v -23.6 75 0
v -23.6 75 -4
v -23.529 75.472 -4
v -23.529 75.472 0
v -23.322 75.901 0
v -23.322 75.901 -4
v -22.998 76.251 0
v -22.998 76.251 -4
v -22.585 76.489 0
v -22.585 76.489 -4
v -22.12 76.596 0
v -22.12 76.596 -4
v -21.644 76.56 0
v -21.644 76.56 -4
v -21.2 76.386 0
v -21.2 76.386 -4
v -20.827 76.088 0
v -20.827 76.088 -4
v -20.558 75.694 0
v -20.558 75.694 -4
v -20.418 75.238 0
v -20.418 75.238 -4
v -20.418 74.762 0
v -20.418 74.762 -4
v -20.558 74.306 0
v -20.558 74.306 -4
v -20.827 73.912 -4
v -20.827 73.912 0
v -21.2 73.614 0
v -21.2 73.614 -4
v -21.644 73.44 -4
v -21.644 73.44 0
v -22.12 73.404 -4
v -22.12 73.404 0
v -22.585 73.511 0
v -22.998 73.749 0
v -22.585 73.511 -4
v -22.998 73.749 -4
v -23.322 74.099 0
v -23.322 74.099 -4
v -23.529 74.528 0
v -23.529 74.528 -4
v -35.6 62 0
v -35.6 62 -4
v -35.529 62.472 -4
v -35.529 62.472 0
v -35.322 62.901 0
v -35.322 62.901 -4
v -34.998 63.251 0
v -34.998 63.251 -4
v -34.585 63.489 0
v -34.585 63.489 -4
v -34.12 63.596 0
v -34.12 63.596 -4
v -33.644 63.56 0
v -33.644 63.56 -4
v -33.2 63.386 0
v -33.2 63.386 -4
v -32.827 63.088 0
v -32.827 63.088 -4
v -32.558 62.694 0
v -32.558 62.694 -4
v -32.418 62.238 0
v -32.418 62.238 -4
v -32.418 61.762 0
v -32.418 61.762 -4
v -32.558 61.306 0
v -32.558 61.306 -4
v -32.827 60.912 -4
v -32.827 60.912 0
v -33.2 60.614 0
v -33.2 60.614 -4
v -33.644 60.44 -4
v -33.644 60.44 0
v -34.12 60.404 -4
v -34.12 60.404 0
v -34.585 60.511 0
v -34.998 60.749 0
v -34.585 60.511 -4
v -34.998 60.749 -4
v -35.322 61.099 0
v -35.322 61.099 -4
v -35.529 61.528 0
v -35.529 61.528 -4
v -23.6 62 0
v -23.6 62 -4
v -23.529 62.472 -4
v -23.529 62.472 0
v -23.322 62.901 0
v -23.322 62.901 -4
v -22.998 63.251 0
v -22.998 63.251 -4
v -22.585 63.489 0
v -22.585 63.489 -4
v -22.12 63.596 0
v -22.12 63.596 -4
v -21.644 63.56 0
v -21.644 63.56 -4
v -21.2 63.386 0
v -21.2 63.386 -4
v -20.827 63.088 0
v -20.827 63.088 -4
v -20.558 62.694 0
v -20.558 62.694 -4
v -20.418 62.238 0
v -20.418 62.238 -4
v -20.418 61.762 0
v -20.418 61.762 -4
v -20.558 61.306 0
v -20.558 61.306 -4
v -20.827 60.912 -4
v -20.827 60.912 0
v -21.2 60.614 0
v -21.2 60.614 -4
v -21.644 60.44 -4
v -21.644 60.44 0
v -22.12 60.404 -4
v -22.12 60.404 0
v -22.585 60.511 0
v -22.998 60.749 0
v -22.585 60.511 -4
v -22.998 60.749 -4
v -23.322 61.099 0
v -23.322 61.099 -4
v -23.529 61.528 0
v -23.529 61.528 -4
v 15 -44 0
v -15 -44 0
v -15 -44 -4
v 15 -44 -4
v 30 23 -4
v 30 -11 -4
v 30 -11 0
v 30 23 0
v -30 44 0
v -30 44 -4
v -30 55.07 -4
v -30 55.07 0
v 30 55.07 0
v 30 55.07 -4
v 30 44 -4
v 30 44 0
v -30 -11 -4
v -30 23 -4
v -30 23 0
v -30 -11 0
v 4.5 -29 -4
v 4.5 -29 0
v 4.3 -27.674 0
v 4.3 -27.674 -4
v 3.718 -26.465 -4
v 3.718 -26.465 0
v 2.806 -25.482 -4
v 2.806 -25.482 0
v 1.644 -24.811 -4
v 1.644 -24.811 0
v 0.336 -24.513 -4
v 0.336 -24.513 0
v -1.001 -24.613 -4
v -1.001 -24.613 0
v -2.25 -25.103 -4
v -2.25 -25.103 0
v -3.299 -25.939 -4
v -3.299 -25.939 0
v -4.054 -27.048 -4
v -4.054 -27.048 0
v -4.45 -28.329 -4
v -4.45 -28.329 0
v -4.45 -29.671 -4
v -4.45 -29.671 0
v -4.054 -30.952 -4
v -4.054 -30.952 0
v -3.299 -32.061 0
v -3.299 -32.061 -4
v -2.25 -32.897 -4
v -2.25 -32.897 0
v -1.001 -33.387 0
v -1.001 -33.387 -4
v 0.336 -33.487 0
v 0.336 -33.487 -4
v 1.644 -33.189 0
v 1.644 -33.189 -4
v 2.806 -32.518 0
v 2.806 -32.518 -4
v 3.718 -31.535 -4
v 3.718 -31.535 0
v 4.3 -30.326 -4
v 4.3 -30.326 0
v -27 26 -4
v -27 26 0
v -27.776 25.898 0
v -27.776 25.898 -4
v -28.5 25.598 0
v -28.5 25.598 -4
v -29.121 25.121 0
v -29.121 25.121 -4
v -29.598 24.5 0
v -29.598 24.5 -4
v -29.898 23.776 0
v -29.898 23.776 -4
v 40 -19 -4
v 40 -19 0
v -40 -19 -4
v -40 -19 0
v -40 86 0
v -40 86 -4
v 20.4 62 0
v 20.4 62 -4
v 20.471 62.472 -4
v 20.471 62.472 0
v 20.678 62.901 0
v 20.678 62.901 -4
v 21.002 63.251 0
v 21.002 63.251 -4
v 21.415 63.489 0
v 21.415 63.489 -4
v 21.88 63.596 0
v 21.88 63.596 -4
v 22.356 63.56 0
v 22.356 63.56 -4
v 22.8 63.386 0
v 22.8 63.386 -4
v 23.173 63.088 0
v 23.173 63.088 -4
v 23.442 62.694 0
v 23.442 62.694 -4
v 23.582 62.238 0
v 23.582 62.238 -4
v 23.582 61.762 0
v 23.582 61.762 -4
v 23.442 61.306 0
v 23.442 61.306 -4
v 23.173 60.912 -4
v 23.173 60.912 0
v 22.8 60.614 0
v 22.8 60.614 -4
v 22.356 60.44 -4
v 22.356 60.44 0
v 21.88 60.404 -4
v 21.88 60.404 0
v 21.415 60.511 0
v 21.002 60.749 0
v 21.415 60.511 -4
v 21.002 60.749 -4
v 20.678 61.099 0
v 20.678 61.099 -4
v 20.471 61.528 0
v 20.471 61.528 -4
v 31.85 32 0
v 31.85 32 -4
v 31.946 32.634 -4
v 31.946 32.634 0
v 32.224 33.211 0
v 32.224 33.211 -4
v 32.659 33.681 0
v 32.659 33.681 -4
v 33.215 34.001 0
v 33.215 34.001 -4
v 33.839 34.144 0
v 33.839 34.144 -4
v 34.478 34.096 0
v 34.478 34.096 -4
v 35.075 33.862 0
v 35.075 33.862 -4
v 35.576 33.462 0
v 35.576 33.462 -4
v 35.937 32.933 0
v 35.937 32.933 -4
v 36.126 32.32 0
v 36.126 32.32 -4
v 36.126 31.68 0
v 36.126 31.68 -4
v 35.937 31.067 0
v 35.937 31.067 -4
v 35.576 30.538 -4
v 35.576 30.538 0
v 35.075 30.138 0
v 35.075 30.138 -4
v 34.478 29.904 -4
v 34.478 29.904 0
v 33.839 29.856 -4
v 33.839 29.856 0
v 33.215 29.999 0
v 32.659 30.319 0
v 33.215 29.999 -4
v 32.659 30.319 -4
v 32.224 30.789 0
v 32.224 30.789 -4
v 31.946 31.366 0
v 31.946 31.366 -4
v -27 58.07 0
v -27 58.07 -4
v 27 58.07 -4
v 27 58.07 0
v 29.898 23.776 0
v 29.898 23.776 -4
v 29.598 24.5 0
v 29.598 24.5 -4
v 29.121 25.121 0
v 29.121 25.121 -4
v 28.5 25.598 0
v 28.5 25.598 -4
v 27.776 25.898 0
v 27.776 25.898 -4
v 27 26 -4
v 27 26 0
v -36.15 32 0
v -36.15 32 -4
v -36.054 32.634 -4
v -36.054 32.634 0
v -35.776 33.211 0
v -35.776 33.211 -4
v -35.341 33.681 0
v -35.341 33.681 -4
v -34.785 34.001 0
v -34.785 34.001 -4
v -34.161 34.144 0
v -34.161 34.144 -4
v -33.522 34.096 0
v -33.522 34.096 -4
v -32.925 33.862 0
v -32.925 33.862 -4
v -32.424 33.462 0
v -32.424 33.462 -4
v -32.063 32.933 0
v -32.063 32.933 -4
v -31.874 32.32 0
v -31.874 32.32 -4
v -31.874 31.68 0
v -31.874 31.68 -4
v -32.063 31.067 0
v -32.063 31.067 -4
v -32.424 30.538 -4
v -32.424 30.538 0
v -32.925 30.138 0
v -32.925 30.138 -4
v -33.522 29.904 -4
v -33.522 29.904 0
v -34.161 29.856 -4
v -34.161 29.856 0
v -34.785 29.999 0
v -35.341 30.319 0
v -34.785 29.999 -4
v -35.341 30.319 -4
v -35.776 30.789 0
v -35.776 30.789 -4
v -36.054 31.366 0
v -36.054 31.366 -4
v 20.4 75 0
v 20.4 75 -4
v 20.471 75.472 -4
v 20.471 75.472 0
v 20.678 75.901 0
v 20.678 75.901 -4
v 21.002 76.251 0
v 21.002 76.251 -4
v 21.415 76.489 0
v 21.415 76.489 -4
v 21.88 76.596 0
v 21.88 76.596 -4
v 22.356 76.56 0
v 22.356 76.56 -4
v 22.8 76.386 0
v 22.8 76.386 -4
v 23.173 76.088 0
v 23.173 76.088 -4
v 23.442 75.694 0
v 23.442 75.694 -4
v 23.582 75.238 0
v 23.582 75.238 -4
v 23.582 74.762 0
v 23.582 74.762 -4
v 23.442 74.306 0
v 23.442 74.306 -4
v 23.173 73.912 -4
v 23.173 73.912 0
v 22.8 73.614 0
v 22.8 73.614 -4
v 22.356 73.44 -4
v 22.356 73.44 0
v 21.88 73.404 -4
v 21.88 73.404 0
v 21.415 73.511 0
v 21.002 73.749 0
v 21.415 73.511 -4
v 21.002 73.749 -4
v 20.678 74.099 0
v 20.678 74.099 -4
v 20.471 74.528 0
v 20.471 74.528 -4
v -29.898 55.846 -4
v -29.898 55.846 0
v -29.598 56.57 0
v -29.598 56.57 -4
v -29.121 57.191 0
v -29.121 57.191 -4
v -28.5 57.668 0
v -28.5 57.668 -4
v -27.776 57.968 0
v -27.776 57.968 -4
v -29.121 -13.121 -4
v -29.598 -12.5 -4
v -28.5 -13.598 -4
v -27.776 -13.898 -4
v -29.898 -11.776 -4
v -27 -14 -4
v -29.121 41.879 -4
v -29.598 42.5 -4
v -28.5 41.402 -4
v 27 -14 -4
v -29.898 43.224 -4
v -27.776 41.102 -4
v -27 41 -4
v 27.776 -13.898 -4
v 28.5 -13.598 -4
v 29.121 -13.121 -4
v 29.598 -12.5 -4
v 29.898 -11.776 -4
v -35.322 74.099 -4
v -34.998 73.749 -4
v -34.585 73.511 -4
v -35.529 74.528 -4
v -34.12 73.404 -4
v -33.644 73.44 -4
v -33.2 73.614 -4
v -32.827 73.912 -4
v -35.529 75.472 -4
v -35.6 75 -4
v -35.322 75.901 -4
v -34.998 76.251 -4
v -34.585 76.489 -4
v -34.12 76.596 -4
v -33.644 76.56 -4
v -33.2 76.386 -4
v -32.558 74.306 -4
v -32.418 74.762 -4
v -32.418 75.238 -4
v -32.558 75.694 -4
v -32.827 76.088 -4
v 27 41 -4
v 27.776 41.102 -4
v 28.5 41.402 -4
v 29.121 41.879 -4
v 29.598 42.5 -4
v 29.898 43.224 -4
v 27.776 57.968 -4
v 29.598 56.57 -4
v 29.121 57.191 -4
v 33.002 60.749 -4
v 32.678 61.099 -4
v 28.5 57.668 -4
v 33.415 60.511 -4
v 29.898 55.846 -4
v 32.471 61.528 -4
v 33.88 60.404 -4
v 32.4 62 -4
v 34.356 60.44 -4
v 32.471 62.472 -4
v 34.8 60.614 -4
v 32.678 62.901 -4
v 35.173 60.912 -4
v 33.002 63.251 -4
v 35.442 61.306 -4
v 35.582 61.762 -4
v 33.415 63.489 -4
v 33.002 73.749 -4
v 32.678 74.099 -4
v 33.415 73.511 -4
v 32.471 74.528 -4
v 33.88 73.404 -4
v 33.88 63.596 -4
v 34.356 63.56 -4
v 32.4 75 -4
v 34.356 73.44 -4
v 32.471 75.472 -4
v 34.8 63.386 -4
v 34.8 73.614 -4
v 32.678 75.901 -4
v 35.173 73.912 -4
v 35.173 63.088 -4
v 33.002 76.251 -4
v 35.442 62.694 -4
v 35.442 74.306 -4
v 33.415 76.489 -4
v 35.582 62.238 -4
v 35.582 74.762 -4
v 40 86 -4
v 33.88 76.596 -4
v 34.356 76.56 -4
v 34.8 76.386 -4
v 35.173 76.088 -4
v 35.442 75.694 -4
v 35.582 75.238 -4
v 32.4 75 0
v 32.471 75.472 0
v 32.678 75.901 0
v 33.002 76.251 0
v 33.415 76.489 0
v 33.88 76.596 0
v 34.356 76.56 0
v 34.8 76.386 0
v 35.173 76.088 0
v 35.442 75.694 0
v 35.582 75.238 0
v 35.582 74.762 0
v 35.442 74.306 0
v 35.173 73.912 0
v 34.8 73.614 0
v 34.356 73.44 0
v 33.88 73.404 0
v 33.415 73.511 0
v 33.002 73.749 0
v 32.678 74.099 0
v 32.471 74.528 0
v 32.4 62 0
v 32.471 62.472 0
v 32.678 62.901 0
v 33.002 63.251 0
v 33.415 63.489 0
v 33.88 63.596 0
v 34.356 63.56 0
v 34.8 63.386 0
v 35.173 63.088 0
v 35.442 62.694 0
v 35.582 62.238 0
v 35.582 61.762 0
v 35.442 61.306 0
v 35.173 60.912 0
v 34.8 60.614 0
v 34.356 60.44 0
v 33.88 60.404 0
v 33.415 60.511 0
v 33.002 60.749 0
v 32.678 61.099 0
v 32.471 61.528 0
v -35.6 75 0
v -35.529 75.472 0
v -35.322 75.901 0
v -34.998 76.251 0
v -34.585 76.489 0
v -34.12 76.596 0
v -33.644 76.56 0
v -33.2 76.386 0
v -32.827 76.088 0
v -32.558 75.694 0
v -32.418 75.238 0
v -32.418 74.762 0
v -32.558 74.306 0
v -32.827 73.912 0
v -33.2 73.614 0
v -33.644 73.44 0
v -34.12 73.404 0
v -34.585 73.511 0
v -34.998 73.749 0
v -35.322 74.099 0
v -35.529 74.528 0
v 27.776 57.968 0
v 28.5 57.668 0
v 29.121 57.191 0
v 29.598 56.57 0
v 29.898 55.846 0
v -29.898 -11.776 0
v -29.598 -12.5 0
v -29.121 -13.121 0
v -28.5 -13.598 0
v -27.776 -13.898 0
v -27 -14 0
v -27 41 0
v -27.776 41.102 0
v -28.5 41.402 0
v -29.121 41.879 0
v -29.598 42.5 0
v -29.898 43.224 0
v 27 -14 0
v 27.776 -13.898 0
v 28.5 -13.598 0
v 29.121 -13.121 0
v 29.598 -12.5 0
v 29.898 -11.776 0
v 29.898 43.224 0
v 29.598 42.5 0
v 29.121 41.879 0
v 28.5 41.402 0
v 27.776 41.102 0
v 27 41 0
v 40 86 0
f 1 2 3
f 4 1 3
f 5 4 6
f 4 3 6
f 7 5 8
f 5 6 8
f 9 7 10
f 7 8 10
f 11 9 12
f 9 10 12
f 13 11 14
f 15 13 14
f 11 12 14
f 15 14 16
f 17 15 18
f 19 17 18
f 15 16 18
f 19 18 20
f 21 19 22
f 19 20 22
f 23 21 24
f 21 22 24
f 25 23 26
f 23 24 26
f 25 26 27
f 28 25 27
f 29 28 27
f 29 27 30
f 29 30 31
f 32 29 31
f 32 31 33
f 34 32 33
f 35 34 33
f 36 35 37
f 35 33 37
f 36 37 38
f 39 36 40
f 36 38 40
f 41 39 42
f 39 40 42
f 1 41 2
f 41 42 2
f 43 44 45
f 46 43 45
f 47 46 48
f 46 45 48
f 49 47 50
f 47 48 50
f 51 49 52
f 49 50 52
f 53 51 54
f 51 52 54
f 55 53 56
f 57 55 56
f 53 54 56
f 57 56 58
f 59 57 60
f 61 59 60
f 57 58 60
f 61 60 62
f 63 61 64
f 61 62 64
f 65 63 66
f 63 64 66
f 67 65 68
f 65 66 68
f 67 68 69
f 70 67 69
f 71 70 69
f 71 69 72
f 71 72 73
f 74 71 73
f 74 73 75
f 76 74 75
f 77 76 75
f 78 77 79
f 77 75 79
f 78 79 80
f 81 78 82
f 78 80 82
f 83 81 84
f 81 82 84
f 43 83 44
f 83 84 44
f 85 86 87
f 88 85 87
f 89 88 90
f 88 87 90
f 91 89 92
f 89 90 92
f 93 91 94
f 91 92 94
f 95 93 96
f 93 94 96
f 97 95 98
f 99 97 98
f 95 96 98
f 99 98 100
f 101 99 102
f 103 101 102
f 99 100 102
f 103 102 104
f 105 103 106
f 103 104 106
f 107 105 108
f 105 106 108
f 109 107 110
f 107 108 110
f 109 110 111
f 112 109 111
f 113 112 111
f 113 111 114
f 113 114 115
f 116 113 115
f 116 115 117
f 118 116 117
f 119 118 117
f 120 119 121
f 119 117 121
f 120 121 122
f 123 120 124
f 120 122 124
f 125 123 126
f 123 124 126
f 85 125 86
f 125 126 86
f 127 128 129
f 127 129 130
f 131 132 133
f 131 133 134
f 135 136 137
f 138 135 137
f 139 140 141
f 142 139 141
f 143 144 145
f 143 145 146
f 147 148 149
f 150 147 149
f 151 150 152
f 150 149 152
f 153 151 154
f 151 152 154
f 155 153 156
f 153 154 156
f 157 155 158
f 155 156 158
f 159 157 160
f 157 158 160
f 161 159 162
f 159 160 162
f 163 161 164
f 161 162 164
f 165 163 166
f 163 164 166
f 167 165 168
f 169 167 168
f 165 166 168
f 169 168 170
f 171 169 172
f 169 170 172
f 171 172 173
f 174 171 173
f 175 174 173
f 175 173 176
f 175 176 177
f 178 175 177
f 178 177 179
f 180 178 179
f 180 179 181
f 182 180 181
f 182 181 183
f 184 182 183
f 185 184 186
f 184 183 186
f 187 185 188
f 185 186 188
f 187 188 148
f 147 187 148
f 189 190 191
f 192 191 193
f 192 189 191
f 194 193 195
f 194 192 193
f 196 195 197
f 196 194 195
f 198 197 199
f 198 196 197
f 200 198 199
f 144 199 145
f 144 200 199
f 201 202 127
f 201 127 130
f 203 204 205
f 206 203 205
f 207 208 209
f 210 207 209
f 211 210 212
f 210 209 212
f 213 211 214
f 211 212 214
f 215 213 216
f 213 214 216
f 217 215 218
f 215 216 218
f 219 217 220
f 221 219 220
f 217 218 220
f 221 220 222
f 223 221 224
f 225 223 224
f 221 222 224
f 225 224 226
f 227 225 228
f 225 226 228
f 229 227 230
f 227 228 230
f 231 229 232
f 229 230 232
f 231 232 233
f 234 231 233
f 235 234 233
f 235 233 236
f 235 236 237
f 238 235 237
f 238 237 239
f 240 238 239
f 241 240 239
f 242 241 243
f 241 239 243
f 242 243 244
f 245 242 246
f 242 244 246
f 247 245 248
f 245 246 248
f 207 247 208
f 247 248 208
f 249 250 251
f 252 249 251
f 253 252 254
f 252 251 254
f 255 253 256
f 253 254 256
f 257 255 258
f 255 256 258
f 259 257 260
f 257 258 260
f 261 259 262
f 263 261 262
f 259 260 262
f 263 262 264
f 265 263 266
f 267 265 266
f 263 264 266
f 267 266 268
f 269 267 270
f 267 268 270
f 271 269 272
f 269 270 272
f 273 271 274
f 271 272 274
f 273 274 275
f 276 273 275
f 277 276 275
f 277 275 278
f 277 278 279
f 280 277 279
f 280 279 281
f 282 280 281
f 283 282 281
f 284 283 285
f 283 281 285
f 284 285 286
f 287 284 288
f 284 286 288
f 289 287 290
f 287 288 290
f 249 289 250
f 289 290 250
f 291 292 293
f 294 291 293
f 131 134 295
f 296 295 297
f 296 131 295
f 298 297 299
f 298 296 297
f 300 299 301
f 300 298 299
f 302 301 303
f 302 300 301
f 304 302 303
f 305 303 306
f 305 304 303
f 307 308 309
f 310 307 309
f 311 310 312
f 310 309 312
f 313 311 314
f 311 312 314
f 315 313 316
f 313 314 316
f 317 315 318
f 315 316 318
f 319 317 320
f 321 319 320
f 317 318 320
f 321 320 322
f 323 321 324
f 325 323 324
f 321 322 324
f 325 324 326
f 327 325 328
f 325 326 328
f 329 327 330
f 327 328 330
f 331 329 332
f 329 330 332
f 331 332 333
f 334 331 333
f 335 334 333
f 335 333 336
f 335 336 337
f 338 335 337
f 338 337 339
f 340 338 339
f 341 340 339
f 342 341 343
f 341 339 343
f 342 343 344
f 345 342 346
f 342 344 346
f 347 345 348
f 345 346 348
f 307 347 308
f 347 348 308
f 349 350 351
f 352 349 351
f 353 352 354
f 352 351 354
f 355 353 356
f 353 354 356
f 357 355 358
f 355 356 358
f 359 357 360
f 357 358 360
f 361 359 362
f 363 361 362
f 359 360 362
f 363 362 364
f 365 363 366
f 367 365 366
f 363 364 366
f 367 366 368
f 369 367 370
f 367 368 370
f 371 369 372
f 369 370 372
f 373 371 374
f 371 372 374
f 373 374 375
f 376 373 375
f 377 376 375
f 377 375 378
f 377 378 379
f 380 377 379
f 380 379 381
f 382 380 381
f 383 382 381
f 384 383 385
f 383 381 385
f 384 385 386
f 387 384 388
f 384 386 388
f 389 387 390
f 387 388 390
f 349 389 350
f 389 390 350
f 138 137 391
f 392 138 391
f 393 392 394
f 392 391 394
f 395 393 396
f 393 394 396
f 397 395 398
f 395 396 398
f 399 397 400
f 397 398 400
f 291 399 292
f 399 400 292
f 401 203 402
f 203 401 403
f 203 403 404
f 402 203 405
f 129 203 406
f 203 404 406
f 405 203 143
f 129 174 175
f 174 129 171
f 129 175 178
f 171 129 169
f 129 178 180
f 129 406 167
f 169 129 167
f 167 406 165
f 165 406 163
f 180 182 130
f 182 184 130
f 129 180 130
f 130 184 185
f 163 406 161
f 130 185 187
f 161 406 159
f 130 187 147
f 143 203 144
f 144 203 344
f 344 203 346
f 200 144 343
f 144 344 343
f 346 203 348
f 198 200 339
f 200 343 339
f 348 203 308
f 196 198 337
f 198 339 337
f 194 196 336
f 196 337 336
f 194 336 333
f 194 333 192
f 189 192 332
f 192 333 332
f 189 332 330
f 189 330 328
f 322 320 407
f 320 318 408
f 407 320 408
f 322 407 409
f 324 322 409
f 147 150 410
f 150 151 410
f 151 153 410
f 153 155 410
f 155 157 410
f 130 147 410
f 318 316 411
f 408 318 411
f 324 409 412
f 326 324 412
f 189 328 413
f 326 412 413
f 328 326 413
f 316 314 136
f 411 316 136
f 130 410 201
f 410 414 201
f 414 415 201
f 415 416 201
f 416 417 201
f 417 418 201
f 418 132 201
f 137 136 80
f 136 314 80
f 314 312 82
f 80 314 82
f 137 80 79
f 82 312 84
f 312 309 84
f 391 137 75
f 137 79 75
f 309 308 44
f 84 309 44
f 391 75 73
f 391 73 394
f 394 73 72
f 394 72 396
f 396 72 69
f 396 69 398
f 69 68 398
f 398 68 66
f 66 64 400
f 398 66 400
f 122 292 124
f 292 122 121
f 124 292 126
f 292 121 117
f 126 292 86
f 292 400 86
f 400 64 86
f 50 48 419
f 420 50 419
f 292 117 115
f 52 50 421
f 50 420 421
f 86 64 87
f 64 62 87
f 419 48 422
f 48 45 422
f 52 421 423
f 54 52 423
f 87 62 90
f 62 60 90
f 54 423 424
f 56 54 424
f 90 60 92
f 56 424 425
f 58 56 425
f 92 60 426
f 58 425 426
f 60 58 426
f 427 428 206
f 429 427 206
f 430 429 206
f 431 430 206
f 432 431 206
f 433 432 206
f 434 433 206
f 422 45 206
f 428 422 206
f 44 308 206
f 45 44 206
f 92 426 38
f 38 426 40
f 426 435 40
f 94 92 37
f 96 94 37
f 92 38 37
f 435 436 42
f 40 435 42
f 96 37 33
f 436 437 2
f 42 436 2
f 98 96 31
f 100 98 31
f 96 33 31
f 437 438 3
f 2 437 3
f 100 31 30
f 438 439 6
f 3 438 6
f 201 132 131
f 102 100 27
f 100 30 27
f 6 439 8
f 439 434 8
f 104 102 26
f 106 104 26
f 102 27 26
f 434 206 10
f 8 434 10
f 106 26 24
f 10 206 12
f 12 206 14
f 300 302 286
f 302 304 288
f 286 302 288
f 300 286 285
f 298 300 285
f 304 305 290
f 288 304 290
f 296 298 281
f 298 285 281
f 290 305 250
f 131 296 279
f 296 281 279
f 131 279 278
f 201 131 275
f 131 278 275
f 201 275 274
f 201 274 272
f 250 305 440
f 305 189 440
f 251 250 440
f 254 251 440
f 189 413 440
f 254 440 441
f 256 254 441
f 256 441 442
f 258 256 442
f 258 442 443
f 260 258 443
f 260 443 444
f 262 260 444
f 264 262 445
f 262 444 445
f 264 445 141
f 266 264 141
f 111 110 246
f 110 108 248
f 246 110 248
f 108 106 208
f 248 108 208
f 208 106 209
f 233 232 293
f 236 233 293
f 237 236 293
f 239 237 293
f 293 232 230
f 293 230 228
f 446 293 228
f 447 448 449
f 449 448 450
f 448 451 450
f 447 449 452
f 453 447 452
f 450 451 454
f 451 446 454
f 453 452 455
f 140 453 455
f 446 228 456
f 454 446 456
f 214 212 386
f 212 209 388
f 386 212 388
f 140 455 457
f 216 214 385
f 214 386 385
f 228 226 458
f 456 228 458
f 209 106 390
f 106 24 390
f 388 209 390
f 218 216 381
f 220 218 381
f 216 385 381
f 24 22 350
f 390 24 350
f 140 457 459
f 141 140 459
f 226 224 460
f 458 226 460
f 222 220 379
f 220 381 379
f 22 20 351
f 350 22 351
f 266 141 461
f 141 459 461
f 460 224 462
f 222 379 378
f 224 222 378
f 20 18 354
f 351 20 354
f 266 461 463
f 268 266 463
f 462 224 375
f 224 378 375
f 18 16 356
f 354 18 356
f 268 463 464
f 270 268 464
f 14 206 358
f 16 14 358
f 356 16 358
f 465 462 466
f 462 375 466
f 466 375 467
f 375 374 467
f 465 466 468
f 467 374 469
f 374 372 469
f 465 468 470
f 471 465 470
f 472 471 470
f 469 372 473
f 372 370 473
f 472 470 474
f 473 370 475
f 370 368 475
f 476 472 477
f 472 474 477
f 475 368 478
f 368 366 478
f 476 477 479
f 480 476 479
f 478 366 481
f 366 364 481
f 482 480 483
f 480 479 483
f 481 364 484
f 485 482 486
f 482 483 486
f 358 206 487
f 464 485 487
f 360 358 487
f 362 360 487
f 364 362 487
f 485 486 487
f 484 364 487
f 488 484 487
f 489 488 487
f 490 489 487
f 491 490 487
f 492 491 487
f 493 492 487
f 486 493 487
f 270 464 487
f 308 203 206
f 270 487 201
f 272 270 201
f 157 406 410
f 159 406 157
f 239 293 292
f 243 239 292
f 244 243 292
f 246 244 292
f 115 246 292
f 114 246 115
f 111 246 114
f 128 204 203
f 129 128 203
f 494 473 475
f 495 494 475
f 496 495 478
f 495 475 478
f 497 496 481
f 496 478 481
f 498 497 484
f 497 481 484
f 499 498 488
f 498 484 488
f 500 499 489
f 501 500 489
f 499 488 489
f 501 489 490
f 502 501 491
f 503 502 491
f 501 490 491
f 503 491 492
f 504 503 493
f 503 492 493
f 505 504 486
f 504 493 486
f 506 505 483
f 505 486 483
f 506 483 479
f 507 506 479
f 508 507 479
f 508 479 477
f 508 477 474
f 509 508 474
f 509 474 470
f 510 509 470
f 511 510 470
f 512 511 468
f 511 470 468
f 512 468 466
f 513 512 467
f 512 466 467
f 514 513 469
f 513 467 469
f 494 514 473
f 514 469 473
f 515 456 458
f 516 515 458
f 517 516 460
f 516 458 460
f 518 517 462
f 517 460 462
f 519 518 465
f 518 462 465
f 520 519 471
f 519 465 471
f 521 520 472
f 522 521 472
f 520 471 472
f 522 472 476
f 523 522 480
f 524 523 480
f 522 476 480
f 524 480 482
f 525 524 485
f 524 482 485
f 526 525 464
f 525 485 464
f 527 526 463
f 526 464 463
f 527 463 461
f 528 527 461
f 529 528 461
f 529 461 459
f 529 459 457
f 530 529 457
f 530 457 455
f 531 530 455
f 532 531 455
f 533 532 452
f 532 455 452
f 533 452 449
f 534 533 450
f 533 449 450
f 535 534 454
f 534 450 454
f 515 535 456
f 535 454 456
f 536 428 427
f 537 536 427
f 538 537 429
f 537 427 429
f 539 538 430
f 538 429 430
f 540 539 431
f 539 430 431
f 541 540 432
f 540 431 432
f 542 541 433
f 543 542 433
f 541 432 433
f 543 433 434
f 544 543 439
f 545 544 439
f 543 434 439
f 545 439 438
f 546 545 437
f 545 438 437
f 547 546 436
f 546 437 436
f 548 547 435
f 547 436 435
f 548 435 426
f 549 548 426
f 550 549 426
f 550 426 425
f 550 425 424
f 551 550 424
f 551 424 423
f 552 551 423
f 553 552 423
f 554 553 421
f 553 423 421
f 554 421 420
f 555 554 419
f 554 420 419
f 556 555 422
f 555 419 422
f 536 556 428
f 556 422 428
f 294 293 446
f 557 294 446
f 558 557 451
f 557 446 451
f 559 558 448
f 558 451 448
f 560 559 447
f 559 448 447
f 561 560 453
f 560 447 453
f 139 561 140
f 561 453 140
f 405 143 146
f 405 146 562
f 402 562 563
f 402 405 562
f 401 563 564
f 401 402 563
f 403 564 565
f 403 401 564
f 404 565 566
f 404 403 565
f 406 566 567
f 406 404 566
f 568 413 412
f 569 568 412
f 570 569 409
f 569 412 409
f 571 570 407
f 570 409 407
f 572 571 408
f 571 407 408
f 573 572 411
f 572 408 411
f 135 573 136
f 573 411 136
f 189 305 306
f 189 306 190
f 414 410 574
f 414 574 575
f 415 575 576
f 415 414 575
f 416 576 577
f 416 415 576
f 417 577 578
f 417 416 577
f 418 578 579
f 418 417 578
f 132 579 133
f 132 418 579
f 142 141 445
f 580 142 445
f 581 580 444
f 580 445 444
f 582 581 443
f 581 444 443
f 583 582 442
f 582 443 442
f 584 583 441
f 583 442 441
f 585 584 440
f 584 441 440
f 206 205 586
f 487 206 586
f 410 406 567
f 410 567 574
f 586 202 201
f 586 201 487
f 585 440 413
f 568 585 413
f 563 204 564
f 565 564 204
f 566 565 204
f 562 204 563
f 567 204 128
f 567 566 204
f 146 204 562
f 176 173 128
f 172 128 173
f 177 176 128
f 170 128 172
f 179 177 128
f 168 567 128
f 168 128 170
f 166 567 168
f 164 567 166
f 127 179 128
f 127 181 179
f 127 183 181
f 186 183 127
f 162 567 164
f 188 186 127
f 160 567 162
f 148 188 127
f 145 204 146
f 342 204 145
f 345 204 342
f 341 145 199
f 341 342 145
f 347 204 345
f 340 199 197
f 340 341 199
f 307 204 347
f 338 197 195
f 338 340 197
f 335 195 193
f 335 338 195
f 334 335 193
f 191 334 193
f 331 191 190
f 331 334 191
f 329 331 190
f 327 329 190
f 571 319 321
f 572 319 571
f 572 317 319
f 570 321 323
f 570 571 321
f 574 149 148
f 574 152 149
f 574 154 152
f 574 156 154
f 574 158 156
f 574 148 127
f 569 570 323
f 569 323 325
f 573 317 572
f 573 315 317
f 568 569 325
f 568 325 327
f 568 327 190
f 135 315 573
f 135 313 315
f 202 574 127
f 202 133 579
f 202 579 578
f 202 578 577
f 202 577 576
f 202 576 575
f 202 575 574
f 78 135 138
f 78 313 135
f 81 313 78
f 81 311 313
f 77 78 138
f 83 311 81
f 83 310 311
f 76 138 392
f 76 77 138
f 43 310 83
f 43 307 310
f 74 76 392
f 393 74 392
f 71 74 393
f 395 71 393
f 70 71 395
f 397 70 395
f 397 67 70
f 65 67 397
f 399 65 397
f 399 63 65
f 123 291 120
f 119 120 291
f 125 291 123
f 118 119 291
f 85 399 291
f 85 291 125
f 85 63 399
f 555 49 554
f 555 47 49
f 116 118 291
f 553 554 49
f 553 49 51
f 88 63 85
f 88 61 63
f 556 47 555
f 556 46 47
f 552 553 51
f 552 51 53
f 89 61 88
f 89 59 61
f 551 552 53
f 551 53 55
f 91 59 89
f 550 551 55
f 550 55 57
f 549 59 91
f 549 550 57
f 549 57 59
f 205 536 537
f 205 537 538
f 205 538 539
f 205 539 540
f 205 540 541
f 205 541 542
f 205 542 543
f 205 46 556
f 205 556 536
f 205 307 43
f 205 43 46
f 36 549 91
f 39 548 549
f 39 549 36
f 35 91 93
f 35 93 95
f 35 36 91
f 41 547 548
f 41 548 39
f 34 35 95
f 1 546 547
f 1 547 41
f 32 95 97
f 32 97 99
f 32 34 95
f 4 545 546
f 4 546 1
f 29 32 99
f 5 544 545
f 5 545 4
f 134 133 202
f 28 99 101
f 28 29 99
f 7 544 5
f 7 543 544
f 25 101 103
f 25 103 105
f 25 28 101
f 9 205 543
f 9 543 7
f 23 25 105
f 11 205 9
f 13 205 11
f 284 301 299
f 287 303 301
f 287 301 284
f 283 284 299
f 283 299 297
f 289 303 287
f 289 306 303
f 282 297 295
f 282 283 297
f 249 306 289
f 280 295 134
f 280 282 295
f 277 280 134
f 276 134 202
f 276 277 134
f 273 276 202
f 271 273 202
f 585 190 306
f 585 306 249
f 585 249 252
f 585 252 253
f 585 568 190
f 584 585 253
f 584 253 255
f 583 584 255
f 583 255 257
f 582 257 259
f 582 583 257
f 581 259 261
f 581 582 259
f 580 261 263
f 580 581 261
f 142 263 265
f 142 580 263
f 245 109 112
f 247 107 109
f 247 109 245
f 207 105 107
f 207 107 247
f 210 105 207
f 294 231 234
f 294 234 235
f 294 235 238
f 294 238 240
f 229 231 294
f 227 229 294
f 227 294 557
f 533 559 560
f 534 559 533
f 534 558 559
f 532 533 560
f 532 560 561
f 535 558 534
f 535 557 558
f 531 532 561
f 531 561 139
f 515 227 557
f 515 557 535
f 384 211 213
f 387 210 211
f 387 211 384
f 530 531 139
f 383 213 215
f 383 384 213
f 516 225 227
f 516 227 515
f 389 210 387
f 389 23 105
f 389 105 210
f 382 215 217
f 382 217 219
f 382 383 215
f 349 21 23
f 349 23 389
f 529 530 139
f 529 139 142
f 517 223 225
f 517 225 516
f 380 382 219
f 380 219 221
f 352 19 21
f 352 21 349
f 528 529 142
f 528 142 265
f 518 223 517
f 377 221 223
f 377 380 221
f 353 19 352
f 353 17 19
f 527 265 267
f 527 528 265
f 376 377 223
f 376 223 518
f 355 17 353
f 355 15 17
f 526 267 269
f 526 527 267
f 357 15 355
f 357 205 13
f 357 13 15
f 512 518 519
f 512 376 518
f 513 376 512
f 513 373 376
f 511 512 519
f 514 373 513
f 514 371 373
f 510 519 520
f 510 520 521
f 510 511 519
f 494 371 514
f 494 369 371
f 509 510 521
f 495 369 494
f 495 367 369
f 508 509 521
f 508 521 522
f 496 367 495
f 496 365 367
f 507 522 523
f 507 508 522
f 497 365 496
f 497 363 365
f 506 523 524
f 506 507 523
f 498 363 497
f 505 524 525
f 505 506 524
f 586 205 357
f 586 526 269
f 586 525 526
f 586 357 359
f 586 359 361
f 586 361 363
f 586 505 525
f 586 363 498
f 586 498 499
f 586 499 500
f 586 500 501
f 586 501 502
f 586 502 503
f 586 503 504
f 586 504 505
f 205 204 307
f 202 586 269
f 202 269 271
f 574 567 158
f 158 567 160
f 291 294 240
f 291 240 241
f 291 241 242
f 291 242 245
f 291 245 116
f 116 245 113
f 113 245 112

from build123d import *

# Parameters (mm, degrees)
SKETCH_1_W          = 80
SKETCH_1_H          = 130
SKETCH_1_R          = 4.5
EXTRUDE_1_DEPTH     = 4
CHAMFER_1_SIZE      = 25
CUT_EXTRUDE_1_DEPTH = 5
SKETCH_4_R          = 2.15
CUT_EXTRUDE_2_DEPTH = 4
SKETCH_5_R          = 1.6
CUT_EXTRUDE_3_DEPTH = 4


with BuildPart() as part:
    # 草图1 → 凸台-拉伸1 (new body)
    with BuildSketch(Plane.XY):
        with Locations((0, 21)):
            Rectangle(SKETCH_1_W, SKETCH_1_H)
        with Locations((0, -29)):
            Circle(SKETCH_1_R, mode=Mode.SUBTRACT)
    extrude(amount=-EXTRUDE_1_DEPTH)

    # 倒角1
    chamfer_1_edges = [part.edges().sort_by_distance(p)[0] for p in [
        (40, -44, -2),
        (-40, -44, -2),
    ]]
    chamfer(chamfer_1_edges, length=CHAMFER_1_SIZE)

    # 草图3 → 切除-拉伸1 (cut)
    with BuildSketch(Plane(origin=(0, 0, -4), x_dir=(-1, 0, 0), z_dir=(0, 0, -1))):
        with BuildLine():
            ThreePointArc((-27, 58.07), (-29.121320344, 57.191320344), (-30, 55.07))
            Line((-30, 55.07), (-30, 44))
            ThreePointArc((-30, 44), (-29.121320344, 41.878679656), (-27, 41))
            Line((-27, 41), (27, 41))
            ThreePointArc((27, 41), (29.121320344, 41.878679656), (30, 44))
            Line((30, 44), (30, 55.07))
            ThreePointArc((30, 55.07), (29.121320344, 57.191320344), (27, 58.07))
            Line((27, 58.07), (-17.606738259, 58.07))
            Line((-17.606738259, 58.07), (-27, 58.07))
        make_face()
        with BuildLine():
            Line((-27, 26), (27, 26))
            ThreePointArc((27, 26), (29.121320344, 25.121320344), (30, 23))
            Line((30, 23), (30, -11))
            ThreePointArc((30, -11), (29.121320344, -13.121320344), (27, -14))
            Line((27, -14), (-27, -14))
            ThreePointArc((-27, -14), (-29.121320344, -13.121320344), (-30, -11))
            Line((-30, -11), (-30, 23))
            ThreePointArc((-30, 23), (-29.121320344, 25.121320344), (-27, 26))
        make_face()
    extrude(amount=-CUT_EXTRUDE_1_DEPTH, mode=Mode.SUBTRACT)

    # 草图4 → 切除-拉伸2 (cut)
    with BuildSketch(Plane(origin=(0, 0, -4), x_dir=(-1, 0, 0), z_dir=(0, 0, -1))):
        with Locations((-34, 32)):
            Circle(SKETCH_4_R)
        with Locations((34, 32)):
            Circle(SKETCH_4_R)
    extrude(amount=-CUT_EXTRUDE_2_DEPTH, mode=Mode.SUBTRACT)

    # 草图5 → 切除-拉伸3 (cut)
    with BuildSketch(Plane(origin=(0, 0, -4), x_dir=(-1, 0, 0), z_dir=(0, 0, -1))):
        with Locations((34, 75)):
            Circle(SKETCH_5_R)
        with Locations((22, 75)):
            Circle(SKETCH_5_R)
        with Locations((-22, 75)):
            Circle(SKETCH_5_R)
        with Locations((-34, 75)):
            Circle(SKETCH_5_R)
        with Locations((34, 62)):
            Circle(SKETCH_5_R)
        with Locations((22, 62)):
            Circle(SKETCH_5_R)
        with Locations((-22, 62)):
            Circle(SKETCH_5_R)
        with Locations((-34, 62)):
            Circle(SKETCH_5_R)
    extrude(amount=-CUT_EXTRUDE_3_DEPTH, mode=Mode.SUBTRACT)


solid = part.part
